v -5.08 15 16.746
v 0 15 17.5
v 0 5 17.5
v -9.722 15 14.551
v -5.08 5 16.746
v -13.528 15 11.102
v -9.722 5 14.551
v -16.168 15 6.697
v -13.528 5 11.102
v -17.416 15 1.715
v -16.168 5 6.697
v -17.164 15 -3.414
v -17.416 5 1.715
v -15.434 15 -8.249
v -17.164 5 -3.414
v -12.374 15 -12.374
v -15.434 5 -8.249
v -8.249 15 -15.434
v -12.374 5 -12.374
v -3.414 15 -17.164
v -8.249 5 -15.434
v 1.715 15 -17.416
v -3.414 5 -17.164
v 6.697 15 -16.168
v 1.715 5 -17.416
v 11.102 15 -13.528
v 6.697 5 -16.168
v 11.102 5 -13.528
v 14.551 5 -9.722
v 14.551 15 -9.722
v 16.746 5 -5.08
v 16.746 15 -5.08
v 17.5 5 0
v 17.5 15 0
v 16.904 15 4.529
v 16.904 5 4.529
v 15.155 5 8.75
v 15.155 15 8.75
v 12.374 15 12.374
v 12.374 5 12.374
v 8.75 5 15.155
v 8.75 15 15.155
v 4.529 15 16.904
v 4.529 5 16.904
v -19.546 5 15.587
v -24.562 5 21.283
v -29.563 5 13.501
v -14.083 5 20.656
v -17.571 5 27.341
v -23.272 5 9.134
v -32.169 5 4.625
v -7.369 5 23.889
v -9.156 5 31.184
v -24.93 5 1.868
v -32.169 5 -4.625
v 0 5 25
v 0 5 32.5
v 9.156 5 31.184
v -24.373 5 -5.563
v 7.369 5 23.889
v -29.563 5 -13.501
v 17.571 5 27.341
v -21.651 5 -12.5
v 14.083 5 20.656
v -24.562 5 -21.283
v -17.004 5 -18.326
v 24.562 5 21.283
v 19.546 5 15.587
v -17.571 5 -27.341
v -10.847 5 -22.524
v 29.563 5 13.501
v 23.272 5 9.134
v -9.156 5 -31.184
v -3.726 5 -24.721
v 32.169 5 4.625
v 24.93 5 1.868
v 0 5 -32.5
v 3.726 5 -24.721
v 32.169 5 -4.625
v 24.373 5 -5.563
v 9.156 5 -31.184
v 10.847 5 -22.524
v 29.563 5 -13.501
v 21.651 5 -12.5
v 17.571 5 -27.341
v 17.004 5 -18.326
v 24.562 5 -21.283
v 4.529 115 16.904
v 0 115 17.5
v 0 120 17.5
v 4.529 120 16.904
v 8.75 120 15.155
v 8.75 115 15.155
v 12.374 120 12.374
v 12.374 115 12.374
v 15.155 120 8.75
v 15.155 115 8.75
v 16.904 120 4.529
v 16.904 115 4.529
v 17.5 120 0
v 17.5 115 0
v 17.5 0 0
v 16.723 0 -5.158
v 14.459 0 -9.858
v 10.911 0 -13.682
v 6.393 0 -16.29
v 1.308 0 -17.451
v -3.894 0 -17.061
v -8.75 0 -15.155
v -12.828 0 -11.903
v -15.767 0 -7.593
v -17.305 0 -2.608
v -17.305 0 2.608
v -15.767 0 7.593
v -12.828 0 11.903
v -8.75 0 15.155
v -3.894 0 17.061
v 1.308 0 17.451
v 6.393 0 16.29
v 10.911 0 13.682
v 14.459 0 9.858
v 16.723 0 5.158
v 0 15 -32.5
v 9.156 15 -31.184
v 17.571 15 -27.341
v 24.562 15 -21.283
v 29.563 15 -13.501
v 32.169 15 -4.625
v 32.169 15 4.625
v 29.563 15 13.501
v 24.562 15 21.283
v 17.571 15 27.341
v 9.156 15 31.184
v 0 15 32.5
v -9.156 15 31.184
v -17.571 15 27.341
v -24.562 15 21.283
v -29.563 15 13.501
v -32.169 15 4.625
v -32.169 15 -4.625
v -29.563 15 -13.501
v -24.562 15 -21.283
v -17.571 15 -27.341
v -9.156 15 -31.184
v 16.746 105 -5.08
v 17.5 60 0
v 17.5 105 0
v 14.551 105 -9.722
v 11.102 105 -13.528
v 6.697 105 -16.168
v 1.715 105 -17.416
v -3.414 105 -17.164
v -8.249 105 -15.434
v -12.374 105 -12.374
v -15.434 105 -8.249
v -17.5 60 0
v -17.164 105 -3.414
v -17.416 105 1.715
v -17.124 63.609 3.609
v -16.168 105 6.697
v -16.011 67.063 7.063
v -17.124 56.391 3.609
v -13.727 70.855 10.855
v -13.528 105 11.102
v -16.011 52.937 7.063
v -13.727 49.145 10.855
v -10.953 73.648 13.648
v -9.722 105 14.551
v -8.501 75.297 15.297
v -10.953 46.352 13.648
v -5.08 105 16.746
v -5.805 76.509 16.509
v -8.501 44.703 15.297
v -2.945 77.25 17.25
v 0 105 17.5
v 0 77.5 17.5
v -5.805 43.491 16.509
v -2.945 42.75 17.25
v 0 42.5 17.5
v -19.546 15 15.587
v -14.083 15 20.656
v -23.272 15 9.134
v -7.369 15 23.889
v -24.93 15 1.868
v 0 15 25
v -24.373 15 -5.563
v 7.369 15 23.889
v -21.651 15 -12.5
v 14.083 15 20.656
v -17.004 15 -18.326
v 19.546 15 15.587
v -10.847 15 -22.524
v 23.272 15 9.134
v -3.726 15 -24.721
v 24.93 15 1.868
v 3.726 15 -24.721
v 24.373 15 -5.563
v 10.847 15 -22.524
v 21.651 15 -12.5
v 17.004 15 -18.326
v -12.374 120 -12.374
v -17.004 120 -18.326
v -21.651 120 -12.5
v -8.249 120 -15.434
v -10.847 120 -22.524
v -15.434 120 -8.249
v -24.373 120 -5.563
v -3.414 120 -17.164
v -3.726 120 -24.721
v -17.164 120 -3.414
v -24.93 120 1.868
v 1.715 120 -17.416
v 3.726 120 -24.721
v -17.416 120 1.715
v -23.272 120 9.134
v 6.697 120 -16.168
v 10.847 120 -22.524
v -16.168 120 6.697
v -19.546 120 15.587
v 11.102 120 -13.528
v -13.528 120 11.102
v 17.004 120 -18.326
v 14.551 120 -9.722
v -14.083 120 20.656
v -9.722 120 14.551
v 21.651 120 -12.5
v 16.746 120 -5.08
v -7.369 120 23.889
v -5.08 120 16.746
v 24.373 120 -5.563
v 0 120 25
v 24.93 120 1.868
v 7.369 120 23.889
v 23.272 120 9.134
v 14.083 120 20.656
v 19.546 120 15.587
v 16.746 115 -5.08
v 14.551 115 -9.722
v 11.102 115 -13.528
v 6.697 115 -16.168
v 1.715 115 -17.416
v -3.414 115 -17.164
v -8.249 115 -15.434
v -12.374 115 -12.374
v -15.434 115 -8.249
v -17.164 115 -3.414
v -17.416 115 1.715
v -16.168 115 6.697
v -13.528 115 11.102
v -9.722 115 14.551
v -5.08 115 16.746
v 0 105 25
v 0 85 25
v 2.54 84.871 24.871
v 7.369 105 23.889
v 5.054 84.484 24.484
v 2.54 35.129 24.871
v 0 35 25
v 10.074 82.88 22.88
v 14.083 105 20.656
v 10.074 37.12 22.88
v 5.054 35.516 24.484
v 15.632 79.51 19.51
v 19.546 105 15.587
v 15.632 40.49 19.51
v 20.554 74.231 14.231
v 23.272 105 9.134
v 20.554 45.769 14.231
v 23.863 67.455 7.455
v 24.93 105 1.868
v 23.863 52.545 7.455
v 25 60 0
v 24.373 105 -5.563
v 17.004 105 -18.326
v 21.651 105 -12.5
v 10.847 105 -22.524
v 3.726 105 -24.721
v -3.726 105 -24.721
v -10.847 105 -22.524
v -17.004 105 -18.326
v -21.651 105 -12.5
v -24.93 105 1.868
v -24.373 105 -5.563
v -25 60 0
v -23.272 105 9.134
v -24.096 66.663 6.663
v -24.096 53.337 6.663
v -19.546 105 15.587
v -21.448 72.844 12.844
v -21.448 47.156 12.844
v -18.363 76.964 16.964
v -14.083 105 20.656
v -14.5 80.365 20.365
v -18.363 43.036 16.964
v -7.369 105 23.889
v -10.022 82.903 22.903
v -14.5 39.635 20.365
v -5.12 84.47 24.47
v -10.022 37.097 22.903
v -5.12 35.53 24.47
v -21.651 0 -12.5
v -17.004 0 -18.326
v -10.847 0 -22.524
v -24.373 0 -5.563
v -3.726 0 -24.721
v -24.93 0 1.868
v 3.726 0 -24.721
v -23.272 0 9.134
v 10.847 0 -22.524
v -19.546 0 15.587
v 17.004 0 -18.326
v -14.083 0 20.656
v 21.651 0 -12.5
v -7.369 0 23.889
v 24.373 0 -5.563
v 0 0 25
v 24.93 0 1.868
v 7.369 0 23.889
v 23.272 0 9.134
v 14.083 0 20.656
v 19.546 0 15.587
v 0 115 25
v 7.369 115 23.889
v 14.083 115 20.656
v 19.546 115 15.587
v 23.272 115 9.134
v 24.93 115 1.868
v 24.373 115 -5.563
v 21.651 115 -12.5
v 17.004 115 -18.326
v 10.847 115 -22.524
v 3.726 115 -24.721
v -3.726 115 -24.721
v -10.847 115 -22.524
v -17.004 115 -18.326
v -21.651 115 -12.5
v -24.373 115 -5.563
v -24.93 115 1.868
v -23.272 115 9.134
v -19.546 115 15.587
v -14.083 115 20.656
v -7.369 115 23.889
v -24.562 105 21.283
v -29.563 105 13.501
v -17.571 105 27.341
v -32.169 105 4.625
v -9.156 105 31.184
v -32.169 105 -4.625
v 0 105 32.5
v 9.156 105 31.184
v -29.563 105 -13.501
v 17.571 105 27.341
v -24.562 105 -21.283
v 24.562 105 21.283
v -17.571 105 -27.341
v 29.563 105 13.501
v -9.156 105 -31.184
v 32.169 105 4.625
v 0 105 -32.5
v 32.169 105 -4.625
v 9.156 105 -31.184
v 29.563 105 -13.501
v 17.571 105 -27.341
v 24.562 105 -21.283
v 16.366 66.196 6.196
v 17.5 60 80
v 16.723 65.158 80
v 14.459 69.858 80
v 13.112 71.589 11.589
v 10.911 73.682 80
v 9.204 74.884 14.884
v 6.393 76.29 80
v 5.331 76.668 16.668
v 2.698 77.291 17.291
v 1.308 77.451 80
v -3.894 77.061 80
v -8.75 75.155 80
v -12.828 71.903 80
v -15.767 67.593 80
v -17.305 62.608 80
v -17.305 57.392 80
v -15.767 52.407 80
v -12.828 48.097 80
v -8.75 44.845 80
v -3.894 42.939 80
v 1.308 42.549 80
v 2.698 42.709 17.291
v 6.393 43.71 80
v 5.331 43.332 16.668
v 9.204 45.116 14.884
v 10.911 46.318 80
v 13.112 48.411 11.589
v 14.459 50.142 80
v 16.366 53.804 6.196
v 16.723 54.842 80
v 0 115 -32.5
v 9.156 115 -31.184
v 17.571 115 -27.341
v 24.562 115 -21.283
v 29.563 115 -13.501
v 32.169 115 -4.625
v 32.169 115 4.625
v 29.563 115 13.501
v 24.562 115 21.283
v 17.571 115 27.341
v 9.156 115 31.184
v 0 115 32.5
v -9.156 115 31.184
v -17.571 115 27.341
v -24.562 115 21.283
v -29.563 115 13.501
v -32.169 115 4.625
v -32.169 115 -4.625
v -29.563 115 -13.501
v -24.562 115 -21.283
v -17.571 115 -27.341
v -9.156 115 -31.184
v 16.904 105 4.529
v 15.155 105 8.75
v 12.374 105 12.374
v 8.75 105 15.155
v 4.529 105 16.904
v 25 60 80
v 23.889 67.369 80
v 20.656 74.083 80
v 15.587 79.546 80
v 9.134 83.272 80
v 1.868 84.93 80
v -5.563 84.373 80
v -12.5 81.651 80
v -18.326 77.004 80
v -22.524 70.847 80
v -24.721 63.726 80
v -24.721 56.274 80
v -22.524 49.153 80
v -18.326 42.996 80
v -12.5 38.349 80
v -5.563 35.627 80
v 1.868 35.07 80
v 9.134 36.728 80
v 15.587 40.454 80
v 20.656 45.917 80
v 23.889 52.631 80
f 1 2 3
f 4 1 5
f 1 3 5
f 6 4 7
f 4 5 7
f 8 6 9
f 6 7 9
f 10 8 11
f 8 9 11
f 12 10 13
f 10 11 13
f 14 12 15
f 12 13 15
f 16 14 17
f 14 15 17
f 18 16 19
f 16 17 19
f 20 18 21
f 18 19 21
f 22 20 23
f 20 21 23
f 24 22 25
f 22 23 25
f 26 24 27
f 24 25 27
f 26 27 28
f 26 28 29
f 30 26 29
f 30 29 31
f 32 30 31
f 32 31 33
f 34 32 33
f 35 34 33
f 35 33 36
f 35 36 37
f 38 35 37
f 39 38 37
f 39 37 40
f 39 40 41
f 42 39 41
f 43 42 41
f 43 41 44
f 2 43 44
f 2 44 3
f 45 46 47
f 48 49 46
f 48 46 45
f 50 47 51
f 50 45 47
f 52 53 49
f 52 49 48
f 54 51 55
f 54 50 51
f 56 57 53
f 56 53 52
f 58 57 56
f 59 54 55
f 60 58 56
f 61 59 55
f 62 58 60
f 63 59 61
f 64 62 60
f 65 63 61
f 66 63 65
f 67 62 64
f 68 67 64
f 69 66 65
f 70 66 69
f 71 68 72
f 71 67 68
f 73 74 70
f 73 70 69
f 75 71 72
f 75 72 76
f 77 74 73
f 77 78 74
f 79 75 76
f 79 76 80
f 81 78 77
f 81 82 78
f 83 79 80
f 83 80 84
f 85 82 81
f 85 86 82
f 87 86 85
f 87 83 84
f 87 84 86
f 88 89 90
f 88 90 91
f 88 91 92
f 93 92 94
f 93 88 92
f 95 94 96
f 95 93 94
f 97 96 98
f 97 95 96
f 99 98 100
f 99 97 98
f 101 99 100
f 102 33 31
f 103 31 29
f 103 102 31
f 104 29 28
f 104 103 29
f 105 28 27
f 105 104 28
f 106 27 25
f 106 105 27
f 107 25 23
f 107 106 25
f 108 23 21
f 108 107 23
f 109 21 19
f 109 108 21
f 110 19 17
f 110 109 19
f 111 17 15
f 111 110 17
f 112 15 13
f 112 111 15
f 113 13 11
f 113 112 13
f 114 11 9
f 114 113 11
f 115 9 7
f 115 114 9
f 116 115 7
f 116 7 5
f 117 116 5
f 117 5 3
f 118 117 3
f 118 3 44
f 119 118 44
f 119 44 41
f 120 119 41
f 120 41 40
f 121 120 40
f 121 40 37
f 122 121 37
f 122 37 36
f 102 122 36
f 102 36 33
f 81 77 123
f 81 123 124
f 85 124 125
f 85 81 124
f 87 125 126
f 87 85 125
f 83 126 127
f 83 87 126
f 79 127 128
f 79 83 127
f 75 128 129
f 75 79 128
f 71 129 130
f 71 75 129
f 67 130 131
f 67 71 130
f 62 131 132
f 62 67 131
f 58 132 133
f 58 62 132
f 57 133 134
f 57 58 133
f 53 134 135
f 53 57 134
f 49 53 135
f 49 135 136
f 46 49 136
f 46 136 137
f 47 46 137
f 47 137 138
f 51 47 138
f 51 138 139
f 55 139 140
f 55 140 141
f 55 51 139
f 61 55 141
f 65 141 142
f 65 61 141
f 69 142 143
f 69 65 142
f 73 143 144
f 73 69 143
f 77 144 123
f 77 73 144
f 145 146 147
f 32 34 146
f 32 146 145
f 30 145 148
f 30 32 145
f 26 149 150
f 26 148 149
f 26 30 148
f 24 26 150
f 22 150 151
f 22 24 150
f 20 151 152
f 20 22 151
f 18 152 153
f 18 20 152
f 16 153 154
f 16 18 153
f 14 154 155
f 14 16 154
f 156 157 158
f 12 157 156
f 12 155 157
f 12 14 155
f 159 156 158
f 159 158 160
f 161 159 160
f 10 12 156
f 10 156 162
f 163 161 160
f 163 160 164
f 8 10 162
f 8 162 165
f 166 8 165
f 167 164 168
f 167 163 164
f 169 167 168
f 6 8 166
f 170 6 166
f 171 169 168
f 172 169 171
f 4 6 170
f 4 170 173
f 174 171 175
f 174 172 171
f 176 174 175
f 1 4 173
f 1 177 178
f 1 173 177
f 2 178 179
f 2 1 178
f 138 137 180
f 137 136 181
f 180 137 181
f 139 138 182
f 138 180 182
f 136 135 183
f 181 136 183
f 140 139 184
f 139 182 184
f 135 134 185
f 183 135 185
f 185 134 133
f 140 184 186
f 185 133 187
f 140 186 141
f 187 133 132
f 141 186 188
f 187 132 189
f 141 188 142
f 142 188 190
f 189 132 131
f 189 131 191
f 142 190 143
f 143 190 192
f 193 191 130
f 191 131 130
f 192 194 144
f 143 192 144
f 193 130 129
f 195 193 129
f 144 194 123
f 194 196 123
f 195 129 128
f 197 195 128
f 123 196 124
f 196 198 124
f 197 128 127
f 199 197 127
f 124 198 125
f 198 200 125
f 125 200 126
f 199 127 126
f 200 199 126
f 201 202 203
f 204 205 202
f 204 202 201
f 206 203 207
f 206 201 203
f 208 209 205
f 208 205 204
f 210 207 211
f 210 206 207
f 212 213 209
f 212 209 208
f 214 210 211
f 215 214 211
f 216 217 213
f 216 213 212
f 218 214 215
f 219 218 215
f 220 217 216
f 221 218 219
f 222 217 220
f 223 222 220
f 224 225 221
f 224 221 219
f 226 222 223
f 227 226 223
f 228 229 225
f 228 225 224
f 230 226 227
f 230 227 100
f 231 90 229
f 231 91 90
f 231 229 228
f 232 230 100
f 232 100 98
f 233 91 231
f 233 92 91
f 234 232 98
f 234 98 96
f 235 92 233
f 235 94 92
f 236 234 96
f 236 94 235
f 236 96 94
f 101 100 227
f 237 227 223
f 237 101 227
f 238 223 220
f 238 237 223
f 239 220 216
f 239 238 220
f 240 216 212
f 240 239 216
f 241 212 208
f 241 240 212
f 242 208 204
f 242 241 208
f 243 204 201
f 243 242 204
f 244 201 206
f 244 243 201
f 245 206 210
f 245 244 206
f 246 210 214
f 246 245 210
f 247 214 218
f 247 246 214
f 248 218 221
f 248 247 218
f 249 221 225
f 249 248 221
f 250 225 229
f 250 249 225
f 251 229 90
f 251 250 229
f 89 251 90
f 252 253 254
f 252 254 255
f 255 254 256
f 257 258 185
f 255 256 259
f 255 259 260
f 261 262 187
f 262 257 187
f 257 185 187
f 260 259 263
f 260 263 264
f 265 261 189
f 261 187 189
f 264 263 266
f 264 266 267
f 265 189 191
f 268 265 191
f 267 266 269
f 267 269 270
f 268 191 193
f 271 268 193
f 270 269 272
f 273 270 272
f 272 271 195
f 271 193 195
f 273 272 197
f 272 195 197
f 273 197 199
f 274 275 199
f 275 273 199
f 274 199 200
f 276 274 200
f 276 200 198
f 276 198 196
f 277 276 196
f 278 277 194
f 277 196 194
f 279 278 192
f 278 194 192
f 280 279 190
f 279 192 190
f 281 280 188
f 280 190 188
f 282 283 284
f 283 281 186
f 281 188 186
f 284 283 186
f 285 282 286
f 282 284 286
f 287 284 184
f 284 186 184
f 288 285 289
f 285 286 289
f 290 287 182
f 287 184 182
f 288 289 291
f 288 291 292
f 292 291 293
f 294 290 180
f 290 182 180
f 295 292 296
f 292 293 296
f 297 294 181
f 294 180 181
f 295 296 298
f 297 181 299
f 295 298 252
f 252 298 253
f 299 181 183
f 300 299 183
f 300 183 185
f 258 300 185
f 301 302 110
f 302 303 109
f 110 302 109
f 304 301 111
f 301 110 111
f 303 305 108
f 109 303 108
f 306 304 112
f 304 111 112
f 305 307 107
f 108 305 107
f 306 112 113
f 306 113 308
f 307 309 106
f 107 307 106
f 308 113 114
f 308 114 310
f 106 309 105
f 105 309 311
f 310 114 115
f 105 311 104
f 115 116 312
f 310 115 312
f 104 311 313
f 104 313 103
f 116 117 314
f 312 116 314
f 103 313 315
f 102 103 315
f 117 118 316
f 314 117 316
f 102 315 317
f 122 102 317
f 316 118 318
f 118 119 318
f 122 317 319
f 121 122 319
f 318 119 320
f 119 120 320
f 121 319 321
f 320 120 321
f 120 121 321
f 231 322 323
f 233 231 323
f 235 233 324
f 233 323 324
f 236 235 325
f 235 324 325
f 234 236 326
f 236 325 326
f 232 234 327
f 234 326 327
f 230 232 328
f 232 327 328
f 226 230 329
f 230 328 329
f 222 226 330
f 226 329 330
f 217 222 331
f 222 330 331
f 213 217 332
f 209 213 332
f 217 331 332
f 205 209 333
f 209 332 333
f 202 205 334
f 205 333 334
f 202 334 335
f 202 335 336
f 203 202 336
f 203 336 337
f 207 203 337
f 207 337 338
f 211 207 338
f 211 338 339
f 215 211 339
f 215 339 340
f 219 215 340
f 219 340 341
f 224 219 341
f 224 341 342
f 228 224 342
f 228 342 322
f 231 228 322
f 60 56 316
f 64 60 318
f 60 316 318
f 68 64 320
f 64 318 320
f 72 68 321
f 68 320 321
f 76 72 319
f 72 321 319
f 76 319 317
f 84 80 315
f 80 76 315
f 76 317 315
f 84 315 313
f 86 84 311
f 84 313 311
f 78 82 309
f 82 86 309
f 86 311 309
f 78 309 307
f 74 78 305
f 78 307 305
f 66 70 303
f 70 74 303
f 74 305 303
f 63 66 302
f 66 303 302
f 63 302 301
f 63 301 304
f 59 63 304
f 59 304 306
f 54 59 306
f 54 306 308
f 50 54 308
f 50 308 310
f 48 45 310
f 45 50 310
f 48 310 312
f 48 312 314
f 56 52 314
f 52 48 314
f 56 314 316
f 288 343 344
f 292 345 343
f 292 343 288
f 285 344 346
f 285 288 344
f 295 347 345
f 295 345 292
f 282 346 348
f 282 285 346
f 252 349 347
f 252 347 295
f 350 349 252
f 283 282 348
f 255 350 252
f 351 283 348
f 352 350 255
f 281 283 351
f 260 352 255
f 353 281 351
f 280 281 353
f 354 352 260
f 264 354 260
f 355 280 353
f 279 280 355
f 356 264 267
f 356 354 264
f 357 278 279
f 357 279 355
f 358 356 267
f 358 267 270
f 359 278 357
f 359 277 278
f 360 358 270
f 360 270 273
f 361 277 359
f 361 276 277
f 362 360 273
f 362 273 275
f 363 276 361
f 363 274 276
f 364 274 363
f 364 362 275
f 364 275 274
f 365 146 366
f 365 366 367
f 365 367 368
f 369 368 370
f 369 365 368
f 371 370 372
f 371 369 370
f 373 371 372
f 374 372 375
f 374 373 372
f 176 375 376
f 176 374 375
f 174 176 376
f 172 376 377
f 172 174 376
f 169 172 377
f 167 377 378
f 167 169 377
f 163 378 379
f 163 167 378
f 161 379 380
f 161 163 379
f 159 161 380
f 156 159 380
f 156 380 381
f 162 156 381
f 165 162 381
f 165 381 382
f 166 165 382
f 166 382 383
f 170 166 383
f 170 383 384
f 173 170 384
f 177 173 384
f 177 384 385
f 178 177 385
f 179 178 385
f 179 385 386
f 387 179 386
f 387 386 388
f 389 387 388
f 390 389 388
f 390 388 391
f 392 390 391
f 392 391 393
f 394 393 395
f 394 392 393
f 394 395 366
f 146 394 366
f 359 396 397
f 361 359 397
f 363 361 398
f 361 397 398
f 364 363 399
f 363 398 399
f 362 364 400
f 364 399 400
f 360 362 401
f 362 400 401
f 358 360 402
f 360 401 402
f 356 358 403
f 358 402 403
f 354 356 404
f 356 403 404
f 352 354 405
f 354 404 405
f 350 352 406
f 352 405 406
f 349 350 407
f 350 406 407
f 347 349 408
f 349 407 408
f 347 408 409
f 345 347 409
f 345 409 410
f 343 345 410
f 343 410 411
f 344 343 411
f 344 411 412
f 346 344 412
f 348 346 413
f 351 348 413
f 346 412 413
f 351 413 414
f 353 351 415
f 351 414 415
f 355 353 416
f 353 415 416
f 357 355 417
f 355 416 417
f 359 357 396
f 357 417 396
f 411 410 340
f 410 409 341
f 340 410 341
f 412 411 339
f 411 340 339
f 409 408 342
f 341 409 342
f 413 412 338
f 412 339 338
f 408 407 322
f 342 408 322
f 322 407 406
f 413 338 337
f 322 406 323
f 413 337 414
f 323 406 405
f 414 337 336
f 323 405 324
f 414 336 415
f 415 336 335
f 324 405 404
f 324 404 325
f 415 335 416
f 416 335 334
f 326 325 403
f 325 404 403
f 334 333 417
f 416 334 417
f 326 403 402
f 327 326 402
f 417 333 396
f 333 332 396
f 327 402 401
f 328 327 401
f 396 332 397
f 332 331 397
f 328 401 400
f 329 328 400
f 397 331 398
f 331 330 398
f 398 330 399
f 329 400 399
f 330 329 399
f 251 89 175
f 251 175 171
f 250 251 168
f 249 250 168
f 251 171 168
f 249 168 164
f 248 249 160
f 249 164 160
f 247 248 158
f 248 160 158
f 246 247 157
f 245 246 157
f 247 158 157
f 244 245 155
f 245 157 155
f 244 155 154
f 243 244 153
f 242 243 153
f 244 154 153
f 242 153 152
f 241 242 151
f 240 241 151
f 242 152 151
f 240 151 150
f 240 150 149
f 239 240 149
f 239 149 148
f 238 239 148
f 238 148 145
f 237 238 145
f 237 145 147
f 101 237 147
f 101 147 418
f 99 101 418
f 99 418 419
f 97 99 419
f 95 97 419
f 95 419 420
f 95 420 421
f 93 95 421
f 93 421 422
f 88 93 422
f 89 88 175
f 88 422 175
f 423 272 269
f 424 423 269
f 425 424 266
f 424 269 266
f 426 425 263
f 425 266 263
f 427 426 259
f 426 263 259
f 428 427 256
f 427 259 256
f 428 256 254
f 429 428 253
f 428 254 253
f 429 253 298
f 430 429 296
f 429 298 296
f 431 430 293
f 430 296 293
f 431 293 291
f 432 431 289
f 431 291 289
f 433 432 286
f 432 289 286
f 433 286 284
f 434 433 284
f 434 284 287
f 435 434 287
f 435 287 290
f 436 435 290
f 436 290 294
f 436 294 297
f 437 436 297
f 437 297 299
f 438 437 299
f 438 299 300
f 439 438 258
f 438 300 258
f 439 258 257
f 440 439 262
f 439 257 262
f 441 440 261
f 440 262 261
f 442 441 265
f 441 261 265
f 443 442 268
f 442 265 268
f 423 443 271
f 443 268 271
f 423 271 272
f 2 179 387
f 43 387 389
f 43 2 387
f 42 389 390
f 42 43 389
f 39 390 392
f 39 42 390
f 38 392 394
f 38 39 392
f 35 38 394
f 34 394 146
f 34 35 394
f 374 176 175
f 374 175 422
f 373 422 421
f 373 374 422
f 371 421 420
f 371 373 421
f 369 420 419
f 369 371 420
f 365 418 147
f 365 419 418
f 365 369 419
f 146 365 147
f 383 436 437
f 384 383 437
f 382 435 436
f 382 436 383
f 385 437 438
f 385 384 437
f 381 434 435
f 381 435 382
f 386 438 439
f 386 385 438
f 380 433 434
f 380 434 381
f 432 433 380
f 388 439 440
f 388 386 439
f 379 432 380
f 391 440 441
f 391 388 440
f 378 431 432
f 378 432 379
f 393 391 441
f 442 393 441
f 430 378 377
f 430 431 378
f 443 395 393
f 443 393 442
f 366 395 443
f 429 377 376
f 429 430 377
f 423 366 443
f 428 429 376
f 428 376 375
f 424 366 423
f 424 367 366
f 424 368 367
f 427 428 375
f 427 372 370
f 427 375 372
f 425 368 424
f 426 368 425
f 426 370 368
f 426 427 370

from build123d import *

# Parameters (mm, degrees)
SKETCH2_R           = 25
BOSS_EXTRUDE1_DEPTH = 120
SKETCH3_R           = 25
BOSS_EXTRUDE2_DEPTH = 80
SHELL1_OUTLINE_R    = 17.5
SHELL1_DEPTH        = 120
SHELL1_START        = -1e-07
SHELL1_2_OUTLINE_R  = 17.5
SHELL1_2_DEPTH      = 80.0000001
BOSS_EXTRUDE3_START = -5
SKETCH4_R           = 32.5
BOSS_EXTRUDE3_DEPTH = 10
SKETCH5_R           = 17.5
CUT_EXTRUDE1_DEPTH  = 144.809770183


with BuildPart() as part:
    # Sketch2 → Boss-Extrude1 (new body)
    with BuildSketch(Plane(origin=(0, 0, 0), x_dir=(1, 0, 0), z_dir=(0, 1, 0))):
        with Locations(Location((0, 0, 0), (0, 0, 270))):
            Circle(SKETCH2_R)
    extrude(amount=BOSS_EXTRUDE1_DEPTH)

    # Sketch3 → Boss-Extrude2 (add)
    with BuildSketch(Plane.XY):
        with Locations((0, 60)):
            Circle(SKETCH3_R)
    extrude(amount=BOSS_EXTRUDE2_DEPTH)

    # Shell1: read off the stored shape, not the designer's step
    # Shell1 outline → Shell1 (cut)
    with BuildSketch(Plane(origin=(0, 0, 0), x_dir=(1, 0, 0), z_dir=(0, 1, 0))):
        Circle(SHELL1_OUTLINE_R)
    extrude(amount=SHELL1_DEPTH, mode=Mode.SUBTRACT)

    # Shell1 2 outline → Shell1 2 (cut)
    with BuildSketch(Plane.XY.offset(SHELL1_START)):
        with Locations((0, 60)):
            Circle(SHELL1_2_OUTLINE_R)
    extrude(amount=SHELL1_2_DEPTH, mode=Mode.SUBTRACT)

    # Sketch4 → Boss-Extrude3 (add)
    with BuildSketch(Plane.XZ.offset(BOSS_EXTRUDE3_START)):
        with Locations(Location((0, 0, 0), (0, 0, 270))):
            Circle(SKETCH4_R)
    boss_extrude3 = extrude(amount=-BOSS_EXTRUDE3_DEPTH)

    # Mirror1: Boss-Extrude3 across plane
    add(boss_extrude3.mirror(Plane.ZX.offset(60)))

    # Sketch5 → Cut-Extrude1 (cut, through all)
    with BuildSketch(Plane.XZ.offset(-5)):
        with Locations(Location((0, 0, 0), (0, 0, 90))):
            Circle(SKETCH5_R)
    extrude(amount=-CUT_EXTRUDE1_DEPTH, mode=Mode.SUBTRACT)


solid = part.part
